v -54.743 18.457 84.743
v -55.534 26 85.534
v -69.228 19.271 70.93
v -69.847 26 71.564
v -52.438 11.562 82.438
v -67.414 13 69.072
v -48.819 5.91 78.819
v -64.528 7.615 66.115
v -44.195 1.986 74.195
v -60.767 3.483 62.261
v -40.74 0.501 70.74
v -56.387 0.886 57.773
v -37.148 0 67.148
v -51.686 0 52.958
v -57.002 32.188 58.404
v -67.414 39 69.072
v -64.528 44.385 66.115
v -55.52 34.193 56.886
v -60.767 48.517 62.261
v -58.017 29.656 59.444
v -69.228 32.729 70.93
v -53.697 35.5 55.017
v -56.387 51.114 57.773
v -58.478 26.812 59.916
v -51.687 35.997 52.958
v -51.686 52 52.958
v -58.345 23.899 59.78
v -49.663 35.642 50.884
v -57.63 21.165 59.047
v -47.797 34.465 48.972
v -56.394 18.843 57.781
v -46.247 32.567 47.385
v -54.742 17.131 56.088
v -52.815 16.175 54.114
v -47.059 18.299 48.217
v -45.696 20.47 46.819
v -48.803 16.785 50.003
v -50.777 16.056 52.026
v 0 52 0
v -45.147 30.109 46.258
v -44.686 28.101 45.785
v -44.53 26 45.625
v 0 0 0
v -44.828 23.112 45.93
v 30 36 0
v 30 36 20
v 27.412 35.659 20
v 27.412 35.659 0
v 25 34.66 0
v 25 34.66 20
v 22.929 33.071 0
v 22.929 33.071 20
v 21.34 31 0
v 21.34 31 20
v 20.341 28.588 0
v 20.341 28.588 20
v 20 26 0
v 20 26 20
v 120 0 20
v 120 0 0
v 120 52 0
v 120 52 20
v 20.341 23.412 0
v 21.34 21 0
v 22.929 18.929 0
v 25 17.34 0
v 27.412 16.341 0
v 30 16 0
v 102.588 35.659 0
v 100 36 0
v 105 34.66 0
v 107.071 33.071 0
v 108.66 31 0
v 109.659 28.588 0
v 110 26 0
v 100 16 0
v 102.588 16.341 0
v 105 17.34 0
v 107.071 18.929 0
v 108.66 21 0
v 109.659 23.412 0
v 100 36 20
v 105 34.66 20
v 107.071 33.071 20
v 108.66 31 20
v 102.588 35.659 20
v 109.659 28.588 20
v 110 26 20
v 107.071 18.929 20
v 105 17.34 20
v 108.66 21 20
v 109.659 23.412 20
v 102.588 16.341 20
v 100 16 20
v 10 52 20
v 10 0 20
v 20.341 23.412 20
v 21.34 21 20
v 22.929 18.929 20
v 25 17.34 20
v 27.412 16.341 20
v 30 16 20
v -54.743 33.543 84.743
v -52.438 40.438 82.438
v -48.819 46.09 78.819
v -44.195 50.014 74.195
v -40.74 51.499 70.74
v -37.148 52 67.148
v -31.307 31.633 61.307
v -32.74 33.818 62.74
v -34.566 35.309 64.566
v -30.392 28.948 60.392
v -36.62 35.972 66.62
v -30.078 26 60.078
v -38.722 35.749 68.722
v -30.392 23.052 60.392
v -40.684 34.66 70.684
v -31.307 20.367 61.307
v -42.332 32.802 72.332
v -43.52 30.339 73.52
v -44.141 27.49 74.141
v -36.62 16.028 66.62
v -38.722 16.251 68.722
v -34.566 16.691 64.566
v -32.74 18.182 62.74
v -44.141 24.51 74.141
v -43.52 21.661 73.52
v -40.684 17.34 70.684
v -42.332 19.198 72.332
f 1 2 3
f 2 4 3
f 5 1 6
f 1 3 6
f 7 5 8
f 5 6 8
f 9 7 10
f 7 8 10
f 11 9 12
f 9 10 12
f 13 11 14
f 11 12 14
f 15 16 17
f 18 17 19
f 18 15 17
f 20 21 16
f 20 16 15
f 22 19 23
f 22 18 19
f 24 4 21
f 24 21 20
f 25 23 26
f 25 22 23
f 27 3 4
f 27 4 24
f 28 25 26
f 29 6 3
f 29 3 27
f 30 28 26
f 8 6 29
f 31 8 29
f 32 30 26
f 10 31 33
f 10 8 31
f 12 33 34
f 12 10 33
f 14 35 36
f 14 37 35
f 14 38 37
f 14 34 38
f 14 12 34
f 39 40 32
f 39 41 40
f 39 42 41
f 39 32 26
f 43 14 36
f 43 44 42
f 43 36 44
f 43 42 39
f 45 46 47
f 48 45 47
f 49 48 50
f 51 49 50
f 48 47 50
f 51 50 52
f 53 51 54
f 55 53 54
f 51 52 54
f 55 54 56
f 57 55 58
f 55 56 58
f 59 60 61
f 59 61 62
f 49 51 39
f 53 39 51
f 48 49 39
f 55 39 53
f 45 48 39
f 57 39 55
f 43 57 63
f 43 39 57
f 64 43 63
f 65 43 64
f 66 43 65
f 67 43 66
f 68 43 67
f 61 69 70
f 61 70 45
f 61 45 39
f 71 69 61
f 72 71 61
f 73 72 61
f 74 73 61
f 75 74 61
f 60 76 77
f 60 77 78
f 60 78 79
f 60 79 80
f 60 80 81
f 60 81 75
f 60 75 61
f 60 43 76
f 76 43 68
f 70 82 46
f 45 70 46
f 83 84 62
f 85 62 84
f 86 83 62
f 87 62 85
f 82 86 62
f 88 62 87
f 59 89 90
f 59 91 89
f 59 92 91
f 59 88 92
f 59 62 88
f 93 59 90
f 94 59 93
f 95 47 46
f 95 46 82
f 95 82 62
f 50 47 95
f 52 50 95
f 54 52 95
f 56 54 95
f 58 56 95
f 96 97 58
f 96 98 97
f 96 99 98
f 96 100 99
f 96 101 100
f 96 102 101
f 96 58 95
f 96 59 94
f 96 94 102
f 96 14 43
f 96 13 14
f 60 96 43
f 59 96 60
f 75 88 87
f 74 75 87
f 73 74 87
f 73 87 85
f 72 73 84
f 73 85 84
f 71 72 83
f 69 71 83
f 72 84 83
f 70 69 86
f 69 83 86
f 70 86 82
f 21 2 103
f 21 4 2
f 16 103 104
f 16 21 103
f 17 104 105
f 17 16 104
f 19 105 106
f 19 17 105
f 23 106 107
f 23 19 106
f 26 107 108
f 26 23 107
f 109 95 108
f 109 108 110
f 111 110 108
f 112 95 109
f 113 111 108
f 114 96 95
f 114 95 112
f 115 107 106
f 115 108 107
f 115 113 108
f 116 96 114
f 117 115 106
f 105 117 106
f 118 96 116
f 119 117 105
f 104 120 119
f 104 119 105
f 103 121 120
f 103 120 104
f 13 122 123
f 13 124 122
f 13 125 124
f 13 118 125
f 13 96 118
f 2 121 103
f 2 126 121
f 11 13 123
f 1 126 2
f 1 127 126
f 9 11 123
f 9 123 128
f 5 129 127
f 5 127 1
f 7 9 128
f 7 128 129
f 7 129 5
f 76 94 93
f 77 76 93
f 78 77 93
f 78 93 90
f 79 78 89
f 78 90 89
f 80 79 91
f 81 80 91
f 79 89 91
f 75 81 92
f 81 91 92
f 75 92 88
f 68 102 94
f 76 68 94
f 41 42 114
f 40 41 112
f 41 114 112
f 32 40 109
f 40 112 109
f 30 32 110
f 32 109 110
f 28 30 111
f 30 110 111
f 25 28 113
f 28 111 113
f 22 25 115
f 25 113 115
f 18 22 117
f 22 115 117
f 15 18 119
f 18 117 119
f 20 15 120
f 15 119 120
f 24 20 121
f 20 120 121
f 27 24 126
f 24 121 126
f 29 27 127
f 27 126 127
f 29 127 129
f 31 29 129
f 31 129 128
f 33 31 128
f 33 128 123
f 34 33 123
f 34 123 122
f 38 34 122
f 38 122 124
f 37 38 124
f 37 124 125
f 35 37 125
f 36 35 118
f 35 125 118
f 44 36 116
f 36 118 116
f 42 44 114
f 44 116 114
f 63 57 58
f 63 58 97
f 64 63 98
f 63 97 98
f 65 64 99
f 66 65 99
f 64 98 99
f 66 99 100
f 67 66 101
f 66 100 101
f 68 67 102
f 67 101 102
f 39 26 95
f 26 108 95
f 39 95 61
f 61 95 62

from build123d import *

# Parameters (mm, degrees)
F1_DEPTH = 52
F2_R     = 10
F3_DEPTH = 21
F5_DEPTH = 21
F6_R     = 25.99999


# Not quite as in the source:
# - a fillet or chamfer is up to 0.001 mm smaller than in the source, because OpenCascade refuses the exact size


with BuildPart() as f1:
    # F0 (on Front) → F1 (new body)
    with BuildSketch(Plane.XZ):
        Polygon((-69.8465537288, 71.5643691526), (0, 0), (120, 0), (120, 20), (10, 20), (-55.5336798983, 85.5336798983), align=None)
    extrude(amount=-F1_DEPTH)

    # F2 (on face) → F3 (cut)
    with BuildSketch(Plane(origin=(15, 0, 15), x_dir=(0.7071067812, 0, -0.7071067812), z_dir=(0.7071067812, 0, 0.7071067812))):
        with Locations((-73.7496867163, 26)):
            Circle(F2_R)
    extrude(amount=-F3_DEPTH, mode=Mode.SUBTRACT)

    # F4 (on face) → F5 (cut)
    with BuildSketch(Plane.XY.offset(20)):
        with BuildLine():
            ThreePointArc((20, 26), (22.9289321881, 18.9289321881), (30, 16))
            Line((30, 16), (100, 16))
            ThreePointArc((100, 16), (107.0710678119, 18.9289321881), (110, 26))
            ThreePointArc((110, 26), (107.0710678119, 33.0710678119), (100, 36))
            Line((100, 36), (30, 36))
            ThreePointArc((30, 36), (22.9289321881, 33.0710678119), (20, 26))
        make_face()
    extrude(amount=-F5_DEPTH, mode=Mode.SUBTRACT)

    # F6 (radius 26 in the source; OpenCascade refuses exactly that, so slightly less here)
    f6_edges = [f1.edges().sort_by_distance(p)[0] for p in [
        (-62.690117, 0, 78.549025),
        (-62.690117, 52, 78.549025),
    ]]
    fillet(f6_edges, radius=F6_R)


solid = f1.part
